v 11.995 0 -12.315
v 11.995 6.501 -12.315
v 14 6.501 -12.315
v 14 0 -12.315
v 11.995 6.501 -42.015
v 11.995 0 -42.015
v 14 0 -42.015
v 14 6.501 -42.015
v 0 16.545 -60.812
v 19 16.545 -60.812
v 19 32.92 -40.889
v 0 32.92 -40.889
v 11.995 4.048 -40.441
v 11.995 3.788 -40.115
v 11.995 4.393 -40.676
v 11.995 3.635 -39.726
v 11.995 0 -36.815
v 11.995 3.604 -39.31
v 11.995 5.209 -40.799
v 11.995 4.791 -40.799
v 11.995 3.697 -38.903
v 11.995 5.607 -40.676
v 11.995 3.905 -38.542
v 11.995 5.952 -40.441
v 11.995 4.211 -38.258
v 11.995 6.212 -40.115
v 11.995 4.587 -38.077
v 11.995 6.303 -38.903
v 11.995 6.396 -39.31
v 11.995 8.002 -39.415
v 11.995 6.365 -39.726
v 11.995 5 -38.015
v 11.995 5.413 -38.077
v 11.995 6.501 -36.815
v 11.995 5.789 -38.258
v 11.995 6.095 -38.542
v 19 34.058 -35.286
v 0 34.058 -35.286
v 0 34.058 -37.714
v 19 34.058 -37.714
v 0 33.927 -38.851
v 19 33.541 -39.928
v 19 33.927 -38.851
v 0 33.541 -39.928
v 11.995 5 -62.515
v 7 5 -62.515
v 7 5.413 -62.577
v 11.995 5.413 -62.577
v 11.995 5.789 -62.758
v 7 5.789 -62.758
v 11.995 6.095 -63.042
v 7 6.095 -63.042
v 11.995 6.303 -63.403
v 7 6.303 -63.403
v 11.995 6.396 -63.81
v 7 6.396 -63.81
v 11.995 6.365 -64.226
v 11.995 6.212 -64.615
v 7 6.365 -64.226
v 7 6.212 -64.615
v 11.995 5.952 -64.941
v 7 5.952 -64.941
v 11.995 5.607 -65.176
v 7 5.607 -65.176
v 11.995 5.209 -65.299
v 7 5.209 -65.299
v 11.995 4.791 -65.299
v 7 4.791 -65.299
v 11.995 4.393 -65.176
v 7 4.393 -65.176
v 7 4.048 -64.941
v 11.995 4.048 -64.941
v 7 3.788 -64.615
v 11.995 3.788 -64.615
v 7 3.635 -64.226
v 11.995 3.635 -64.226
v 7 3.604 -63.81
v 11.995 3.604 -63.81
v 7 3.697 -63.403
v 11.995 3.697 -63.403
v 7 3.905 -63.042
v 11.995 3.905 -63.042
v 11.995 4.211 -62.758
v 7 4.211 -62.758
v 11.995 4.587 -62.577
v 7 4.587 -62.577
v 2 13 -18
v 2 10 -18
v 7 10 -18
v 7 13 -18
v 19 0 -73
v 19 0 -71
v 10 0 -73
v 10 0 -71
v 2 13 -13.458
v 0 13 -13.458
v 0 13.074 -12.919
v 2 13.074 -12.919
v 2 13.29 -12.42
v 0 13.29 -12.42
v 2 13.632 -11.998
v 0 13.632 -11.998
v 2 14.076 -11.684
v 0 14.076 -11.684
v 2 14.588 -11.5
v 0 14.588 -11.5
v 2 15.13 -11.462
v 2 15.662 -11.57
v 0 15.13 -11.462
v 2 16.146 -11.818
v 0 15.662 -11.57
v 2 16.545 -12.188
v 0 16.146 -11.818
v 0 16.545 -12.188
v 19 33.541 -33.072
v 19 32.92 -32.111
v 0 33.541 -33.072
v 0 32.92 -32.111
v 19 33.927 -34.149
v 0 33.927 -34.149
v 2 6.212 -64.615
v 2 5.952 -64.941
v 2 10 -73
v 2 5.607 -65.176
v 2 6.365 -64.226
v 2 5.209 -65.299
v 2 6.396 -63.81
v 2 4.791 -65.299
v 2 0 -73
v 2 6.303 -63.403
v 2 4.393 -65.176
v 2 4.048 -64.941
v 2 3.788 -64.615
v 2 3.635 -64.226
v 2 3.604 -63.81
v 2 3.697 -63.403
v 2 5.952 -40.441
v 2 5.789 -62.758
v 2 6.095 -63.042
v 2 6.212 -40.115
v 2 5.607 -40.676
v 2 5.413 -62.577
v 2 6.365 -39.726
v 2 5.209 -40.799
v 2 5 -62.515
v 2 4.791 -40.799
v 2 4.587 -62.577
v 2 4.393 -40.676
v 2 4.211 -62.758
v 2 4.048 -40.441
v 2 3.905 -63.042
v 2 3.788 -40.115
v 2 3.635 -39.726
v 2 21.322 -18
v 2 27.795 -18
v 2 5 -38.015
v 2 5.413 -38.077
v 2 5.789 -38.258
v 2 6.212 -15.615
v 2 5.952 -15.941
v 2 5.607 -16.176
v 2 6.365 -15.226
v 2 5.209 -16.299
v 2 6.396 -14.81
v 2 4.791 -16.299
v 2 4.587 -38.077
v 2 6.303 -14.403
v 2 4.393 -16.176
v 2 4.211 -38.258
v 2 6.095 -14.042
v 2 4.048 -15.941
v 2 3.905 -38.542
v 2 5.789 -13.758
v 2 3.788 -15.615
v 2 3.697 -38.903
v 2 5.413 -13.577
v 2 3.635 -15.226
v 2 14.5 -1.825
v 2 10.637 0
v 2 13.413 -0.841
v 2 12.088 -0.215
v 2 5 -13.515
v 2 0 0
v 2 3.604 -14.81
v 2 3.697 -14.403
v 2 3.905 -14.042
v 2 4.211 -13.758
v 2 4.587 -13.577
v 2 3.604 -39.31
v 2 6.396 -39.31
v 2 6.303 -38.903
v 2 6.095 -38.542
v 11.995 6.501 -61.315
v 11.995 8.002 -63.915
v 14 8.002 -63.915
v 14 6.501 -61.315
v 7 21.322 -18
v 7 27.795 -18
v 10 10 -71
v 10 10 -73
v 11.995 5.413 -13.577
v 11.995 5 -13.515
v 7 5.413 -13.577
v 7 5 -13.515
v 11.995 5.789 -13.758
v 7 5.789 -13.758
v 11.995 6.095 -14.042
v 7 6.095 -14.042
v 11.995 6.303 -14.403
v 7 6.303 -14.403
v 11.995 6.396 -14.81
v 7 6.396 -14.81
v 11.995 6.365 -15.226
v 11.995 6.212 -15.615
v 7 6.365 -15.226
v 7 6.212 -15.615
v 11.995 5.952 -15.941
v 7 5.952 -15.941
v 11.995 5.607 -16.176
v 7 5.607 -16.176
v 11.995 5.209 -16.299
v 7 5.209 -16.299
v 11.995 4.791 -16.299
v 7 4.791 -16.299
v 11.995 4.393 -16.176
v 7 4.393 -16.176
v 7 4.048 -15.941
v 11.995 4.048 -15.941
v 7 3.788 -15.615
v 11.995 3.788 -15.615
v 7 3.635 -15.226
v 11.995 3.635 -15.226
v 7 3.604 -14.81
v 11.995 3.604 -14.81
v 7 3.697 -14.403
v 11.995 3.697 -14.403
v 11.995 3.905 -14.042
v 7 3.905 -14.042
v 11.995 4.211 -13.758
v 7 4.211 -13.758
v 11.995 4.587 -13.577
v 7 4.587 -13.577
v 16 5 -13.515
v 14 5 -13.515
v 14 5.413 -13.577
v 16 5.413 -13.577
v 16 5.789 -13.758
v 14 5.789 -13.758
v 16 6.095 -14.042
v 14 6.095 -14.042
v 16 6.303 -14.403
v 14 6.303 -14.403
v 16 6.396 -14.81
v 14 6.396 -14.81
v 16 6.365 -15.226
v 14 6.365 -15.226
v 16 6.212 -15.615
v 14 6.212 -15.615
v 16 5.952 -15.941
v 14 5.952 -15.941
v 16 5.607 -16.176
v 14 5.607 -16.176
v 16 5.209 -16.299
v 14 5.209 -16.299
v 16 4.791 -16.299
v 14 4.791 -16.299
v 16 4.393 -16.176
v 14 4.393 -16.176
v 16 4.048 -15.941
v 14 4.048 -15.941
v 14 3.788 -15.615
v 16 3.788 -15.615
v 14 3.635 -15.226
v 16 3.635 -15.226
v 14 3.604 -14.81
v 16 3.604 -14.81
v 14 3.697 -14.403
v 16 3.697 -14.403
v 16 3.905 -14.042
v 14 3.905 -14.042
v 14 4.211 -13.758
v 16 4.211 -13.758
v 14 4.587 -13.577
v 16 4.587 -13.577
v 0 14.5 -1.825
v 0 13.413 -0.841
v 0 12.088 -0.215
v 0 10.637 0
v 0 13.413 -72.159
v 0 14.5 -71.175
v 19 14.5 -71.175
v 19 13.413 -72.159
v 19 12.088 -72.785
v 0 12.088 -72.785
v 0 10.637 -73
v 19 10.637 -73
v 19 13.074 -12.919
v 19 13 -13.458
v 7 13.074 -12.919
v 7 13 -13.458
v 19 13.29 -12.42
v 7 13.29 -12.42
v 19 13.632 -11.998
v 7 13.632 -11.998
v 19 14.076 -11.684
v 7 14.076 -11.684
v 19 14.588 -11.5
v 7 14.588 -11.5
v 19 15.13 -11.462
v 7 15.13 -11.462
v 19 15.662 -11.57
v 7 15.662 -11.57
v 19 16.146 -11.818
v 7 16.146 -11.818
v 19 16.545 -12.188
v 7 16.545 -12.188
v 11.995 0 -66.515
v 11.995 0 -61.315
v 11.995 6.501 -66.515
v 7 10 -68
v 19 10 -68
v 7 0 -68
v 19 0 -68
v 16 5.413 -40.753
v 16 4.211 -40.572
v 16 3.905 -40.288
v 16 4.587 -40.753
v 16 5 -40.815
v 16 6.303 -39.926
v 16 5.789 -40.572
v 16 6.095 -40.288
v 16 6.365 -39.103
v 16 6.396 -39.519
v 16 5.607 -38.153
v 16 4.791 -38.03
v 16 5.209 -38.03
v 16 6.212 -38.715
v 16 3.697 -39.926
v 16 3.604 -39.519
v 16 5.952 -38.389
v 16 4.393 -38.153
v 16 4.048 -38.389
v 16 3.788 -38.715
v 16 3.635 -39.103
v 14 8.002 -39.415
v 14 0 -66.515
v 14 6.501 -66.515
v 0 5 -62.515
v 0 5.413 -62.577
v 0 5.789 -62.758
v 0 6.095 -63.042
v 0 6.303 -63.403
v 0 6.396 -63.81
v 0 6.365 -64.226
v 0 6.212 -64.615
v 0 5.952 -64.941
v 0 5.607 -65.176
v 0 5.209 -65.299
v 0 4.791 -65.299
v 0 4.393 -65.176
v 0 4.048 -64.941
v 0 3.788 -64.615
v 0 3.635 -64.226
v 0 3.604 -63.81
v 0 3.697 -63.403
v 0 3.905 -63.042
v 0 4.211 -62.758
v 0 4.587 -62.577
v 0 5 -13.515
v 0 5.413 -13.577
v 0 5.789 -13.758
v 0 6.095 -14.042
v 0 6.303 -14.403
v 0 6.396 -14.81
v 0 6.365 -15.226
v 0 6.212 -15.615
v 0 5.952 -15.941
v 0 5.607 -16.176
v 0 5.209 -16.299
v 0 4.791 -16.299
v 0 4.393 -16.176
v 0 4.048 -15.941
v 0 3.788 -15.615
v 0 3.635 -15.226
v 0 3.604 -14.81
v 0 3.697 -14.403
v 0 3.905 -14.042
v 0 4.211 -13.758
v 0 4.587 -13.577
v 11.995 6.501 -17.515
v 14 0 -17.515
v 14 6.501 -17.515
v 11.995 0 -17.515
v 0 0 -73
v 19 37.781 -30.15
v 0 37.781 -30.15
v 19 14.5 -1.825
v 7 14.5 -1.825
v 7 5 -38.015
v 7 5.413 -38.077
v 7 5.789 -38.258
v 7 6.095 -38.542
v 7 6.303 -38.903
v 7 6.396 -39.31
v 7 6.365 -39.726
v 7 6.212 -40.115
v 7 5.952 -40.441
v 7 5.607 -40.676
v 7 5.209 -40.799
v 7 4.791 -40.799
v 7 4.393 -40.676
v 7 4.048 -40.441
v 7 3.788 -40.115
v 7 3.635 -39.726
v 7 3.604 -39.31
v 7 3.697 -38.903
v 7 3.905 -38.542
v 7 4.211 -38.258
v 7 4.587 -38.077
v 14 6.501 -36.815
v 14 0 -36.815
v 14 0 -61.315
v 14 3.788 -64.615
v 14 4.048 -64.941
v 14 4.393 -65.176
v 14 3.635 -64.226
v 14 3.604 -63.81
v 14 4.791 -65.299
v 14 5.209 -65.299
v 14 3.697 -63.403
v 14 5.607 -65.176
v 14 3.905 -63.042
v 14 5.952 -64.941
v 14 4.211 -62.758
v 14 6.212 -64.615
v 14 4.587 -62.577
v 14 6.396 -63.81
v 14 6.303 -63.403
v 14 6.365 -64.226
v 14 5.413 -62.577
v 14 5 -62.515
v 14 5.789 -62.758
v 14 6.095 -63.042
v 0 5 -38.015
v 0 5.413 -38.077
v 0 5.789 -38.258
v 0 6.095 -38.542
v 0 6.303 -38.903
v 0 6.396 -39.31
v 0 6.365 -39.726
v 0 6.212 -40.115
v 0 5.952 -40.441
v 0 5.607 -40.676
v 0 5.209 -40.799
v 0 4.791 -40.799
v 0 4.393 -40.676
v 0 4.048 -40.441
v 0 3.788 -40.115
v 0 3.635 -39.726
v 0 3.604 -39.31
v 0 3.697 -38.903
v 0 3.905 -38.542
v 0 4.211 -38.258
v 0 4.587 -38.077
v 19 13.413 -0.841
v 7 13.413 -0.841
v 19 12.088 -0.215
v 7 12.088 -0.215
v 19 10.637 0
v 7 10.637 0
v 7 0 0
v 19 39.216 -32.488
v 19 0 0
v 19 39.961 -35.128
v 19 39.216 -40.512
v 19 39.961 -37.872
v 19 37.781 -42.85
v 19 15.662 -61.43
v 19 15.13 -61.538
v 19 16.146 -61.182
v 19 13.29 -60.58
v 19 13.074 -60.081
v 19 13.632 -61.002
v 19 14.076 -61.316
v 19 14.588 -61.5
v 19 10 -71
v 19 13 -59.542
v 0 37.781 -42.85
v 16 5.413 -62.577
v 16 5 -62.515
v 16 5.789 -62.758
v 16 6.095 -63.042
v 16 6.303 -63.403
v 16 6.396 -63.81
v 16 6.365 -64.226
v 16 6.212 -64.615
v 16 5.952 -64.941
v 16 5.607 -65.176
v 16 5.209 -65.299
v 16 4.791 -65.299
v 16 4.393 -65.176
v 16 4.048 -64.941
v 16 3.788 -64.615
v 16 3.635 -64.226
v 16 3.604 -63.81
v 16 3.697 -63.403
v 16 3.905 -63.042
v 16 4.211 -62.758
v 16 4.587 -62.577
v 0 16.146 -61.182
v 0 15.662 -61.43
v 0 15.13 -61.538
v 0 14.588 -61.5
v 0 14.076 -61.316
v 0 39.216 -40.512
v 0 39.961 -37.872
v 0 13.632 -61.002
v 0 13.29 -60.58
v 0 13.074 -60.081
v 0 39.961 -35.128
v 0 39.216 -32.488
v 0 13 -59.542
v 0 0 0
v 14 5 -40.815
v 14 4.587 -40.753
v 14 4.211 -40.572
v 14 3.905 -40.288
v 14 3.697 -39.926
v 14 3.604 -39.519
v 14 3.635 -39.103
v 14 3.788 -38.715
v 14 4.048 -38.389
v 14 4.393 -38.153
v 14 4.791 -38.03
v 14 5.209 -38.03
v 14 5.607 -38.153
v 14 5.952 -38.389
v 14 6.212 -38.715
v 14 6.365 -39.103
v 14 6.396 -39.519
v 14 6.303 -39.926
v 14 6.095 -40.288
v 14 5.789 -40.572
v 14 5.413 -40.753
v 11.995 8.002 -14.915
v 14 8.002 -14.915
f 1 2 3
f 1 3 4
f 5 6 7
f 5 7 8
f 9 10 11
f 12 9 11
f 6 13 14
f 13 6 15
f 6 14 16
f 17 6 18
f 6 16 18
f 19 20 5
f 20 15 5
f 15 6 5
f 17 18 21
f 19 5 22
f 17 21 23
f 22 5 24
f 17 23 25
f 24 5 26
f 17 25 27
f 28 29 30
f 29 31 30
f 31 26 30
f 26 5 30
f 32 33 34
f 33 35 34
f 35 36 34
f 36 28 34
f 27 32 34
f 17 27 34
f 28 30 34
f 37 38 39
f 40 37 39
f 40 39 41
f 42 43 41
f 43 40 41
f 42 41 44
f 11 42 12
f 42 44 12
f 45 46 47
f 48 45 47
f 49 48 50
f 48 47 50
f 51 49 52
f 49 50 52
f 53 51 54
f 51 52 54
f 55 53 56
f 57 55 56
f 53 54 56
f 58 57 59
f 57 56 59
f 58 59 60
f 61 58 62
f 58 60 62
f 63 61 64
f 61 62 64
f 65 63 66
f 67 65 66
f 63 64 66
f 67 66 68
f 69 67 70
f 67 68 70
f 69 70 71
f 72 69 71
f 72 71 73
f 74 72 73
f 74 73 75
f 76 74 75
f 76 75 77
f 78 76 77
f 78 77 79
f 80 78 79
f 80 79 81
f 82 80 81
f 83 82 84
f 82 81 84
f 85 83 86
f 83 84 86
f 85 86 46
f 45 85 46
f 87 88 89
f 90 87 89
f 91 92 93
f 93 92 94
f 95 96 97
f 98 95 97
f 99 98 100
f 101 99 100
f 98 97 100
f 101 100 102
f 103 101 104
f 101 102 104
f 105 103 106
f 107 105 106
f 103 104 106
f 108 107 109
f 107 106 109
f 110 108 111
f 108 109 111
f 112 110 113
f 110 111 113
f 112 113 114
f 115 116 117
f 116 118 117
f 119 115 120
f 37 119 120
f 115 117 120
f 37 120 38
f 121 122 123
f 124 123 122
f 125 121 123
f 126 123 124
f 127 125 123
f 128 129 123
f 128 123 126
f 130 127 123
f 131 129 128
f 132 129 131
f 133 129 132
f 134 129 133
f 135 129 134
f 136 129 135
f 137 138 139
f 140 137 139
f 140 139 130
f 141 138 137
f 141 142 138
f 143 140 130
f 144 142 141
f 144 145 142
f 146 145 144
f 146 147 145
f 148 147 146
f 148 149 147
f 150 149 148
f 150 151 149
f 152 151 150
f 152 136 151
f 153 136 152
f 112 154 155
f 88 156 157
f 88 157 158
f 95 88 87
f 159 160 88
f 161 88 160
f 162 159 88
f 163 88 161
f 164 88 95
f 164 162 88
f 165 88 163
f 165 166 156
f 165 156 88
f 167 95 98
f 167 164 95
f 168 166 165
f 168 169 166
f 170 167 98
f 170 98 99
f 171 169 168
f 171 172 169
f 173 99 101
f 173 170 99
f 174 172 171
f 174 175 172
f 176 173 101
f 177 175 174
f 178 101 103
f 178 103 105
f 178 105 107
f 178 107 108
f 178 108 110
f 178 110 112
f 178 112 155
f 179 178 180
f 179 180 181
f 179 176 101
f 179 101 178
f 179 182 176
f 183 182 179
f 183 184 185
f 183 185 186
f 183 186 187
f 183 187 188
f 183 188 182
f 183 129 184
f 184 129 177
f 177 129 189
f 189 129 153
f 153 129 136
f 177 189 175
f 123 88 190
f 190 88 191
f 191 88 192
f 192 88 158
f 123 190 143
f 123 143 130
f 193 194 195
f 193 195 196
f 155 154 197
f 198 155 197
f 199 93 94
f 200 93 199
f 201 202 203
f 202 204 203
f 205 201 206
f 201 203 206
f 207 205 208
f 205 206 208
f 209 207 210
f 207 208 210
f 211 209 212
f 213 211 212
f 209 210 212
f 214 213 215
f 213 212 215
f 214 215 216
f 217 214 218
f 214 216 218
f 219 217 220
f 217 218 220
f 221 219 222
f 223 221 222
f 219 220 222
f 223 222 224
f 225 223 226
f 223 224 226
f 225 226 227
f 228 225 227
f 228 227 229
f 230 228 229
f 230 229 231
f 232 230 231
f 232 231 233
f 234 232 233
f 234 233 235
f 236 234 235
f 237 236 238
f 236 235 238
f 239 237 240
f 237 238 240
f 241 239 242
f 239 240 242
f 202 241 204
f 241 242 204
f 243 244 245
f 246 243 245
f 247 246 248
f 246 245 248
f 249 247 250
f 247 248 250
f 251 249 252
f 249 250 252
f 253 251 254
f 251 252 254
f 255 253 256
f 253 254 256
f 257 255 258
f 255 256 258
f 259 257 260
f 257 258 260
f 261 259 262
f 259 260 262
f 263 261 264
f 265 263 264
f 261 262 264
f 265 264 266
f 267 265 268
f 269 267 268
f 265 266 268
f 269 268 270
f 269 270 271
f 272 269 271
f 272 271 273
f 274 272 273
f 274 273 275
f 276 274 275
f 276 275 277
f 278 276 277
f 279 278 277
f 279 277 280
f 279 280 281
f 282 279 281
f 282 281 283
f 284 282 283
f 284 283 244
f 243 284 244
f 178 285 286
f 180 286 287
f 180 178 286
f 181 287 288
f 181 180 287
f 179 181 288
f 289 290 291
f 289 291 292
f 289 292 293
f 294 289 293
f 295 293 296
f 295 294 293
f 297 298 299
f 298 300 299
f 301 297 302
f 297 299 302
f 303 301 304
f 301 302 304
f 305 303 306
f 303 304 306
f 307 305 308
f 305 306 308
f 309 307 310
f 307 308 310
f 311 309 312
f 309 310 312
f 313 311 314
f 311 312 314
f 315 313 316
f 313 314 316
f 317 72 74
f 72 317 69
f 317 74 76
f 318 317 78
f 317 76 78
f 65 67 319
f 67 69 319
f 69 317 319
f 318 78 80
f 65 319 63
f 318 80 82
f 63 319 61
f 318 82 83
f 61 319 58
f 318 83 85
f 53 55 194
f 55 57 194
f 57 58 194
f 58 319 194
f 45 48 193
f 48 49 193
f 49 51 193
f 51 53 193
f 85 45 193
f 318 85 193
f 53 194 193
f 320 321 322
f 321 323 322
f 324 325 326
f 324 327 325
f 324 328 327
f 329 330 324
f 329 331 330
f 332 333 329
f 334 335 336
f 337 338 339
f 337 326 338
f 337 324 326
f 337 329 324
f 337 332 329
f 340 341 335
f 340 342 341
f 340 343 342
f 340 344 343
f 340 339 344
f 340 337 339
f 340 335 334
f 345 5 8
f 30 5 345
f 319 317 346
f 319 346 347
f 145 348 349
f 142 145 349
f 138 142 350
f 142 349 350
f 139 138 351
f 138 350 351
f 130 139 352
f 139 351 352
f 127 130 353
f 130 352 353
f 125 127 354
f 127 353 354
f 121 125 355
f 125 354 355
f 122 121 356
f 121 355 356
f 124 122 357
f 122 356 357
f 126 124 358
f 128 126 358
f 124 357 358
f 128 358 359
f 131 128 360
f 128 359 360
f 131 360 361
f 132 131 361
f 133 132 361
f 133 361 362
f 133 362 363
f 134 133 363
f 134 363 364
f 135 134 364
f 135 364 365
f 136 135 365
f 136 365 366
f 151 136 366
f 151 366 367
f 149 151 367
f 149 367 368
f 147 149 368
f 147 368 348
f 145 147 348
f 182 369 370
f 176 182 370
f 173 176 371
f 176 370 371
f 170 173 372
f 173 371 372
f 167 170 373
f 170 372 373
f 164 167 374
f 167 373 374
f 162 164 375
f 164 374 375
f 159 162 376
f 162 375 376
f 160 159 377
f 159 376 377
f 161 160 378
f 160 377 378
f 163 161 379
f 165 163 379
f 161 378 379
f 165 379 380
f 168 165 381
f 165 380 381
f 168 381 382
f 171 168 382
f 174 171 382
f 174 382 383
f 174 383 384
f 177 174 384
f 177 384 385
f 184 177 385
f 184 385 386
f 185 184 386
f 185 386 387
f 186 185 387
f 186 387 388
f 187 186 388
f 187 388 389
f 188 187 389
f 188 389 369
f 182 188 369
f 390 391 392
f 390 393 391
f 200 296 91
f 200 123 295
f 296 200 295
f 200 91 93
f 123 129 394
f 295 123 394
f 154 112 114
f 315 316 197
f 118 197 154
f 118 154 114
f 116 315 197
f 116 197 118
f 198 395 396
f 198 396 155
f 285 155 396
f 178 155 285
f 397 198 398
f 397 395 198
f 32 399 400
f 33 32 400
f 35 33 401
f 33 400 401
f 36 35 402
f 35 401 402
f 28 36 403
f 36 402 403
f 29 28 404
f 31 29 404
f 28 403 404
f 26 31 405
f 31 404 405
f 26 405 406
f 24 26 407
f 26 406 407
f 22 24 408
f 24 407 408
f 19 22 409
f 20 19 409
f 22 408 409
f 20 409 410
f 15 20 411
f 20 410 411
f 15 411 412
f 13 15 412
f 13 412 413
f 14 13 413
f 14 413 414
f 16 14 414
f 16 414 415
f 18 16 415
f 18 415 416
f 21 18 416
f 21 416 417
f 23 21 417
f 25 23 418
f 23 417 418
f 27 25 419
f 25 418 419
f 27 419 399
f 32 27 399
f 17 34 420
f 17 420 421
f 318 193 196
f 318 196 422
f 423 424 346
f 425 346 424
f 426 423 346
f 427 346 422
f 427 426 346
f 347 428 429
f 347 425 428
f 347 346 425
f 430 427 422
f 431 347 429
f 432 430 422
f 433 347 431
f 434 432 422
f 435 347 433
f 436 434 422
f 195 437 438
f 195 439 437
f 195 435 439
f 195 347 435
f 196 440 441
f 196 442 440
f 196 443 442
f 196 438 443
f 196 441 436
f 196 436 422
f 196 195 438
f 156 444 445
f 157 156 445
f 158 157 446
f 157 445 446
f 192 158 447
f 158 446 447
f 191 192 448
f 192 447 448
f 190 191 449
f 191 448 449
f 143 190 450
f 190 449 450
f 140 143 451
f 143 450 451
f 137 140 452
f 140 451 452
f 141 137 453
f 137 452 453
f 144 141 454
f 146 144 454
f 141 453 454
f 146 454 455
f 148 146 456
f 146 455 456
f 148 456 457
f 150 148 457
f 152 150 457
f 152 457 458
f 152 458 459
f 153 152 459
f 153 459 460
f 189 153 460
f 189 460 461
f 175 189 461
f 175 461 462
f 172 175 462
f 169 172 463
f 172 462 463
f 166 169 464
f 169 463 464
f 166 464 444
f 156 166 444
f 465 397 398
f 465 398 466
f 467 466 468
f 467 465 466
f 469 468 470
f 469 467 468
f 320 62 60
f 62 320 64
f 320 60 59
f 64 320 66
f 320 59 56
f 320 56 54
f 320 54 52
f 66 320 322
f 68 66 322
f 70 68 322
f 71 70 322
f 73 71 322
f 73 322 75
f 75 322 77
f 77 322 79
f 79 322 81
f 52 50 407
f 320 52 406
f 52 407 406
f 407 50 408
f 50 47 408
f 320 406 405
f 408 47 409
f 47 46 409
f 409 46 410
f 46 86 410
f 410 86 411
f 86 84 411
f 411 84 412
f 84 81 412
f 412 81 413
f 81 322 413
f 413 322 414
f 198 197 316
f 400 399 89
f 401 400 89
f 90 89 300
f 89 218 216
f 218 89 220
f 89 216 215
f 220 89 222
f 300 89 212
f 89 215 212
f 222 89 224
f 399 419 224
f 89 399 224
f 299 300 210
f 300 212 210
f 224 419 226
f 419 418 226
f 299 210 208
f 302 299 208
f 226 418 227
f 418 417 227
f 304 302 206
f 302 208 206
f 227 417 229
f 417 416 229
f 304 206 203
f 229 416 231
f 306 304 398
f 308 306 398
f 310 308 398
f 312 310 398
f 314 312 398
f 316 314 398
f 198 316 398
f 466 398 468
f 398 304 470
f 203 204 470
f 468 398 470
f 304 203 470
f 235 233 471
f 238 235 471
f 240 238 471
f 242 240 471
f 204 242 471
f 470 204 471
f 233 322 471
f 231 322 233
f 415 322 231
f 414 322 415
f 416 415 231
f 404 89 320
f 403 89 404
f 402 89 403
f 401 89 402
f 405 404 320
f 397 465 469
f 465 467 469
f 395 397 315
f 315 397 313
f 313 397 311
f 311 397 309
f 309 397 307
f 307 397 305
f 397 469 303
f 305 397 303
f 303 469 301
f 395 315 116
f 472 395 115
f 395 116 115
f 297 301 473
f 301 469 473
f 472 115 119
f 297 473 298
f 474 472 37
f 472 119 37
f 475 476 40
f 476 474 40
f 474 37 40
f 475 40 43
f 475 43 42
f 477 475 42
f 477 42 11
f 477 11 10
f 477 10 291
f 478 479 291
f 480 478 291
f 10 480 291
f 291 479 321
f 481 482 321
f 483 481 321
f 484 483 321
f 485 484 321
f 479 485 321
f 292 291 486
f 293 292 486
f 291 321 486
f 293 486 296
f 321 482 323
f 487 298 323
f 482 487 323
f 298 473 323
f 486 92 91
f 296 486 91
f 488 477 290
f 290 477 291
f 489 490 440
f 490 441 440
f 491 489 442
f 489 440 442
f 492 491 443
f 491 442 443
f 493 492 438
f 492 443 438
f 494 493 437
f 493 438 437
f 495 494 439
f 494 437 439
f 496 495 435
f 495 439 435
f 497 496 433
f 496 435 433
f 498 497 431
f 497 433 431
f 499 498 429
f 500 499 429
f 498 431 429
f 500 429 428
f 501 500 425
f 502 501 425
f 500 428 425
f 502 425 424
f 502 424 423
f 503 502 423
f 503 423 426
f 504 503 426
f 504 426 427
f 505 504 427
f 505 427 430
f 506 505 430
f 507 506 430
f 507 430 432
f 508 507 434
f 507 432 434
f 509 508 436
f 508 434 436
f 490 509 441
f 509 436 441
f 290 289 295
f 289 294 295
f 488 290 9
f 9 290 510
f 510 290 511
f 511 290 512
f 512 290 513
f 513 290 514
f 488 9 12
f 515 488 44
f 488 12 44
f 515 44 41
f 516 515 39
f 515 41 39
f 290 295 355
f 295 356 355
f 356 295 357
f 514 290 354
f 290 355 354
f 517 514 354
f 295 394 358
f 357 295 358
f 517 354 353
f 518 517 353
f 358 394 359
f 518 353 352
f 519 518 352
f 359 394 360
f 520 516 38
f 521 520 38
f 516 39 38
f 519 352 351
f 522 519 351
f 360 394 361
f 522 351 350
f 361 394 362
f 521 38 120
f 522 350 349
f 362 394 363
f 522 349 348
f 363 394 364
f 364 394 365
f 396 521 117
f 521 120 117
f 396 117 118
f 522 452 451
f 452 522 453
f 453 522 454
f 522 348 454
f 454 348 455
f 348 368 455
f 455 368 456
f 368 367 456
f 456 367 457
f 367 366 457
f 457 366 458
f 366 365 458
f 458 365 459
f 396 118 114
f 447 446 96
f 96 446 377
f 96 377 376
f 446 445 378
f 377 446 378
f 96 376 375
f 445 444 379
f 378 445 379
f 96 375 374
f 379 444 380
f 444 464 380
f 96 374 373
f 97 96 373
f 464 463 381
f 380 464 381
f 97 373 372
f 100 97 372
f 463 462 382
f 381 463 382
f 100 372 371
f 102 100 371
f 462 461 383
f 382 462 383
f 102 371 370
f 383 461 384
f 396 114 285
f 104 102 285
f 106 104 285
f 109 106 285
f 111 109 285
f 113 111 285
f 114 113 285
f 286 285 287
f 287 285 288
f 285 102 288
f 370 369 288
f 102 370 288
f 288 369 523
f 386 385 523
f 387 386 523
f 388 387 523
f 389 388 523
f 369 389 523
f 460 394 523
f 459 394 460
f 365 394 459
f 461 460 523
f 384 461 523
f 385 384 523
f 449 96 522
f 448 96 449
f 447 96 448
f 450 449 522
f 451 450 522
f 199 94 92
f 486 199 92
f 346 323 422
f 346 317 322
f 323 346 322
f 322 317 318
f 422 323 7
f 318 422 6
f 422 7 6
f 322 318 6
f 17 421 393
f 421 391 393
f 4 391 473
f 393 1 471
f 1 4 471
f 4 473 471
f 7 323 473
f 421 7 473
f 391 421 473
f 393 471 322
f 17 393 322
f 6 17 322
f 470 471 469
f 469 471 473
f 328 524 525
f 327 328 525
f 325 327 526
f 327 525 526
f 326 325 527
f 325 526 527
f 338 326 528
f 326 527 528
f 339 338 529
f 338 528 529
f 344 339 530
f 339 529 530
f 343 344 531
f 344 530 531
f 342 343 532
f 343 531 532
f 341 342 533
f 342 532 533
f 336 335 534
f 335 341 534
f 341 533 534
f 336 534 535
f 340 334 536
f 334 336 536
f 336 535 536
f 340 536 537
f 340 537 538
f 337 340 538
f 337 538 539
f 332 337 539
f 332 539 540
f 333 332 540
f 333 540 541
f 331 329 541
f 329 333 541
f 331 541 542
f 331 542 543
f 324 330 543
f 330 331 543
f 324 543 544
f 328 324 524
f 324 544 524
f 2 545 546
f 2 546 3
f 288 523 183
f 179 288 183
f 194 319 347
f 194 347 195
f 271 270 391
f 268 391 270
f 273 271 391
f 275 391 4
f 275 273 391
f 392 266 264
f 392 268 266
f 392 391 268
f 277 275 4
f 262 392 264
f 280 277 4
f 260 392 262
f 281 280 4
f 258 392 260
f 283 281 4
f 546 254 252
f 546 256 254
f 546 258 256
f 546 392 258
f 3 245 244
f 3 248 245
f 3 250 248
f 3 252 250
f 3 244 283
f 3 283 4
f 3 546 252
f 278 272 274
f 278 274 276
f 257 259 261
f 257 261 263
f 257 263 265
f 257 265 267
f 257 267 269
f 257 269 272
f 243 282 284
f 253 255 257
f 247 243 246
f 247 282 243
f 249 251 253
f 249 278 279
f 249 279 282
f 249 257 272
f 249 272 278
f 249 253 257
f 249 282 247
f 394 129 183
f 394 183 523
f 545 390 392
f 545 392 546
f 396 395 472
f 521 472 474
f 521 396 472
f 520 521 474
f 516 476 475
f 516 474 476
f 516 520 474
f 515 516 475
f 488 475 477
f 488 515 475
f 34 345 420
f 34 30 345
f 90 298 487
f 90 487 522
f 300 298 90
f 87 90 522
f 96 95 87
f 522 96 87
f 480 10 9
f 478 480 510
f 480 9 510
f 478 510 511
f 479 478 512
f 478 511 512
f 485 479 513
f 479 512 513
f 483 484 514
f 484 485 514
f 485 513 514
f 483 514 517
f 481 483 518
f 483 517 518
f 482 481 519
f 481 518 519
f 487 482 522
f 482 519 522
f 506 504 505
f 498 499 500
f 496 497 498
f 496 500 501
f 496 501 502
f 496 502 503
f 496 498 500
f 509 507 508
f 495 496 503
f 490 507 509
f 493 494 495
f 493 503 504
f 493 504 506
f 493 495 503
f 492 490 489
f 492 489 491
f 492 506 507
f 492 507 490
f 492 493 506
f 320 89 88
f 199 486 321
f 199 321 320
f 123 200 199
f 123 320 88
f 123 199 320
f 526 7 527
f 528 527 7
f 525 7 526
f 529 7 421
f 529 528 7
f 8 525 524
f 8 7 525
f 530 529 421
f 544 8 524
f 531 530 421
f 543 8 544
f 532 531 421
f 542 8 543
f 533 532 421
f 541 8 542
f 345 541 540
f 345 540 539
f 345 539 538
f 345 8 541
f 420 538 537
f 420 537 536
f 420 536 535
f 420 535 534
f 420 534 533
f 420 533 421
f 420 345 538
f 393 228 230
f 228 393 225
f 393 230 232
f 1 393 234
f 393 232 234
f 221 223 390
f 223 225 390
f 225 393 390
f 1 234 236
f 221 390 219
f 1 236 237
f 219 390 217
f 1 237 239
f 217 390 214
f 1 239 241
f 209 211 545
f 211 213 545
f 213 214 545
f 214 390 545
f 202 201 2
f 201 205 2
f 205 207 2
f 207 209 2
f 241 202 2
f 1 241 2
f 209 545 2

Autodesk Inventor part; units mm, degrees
ref_plane "YZ Plane" through (0, 0, 0) normal (1, 0, 0) x (0, 1, 0)
ref_plane "XZ Plane" through (0, 0, 0) normal (0, 1, 0) x (-1, 0, 0)
ref_plane "XY Plane" through (0, 0, 0) normal (0, 0, 1) x (1, 0, 0)
sketch "Sketch1" plane through (0, 0, 0) normal (0, 1, 0) x (-1, 0, 0)
  line L0 (0, 0) -> (-19, 0)
  line L1 (-19, 0) -> (-19, -73)
  line L2 (-19, -73) -> (0, -73)
  line L3 (0, -73) -> (0, 0)
  dimension "d0" = 19
  dimension "d1" = 73
extrude "Extrusion1" add sketch "Sketch1" along normal blind 13
sketch "Sketch2" plane through (19, 0, 0) normal (1, 0, 0) x (0, 0, -1)
  line L0 (0, 13) -> (0, 43) construction
  line L1 (0, 43) -> (205, 43) construction
  line L2 (0, 13) -> (0, 13.5) construction
  line L3 (0, 0) -> (0, 13) construction
  line L4 (0, 13) -> (0, 13) construction
  line L5 (0, 13) -> (73, 13) construction
  line L6 (0, 13) -> (0, 13) construction
  line L7 (0, 13) -> (73, 13) construction
  line L8 (0, 13) -> (73, 13) construction
  line L9 (36.5, 13) -> (36.5, 43) construction
  line L10 (36.5, 43) -> (0, 13) construction
  line L11 (73, 13) -> (36.5, 43) construction
  line L12 (36.5, 43) -> (30.3197, 37.9203) construction
  line L13 (30.3197, 37.9203) -> (33.4945, 34.0576) construction
  line L14 (33.4945, 34.0576) -> (7.8744, 13) construction
  line L15 (36.5, 43) -> (42.6803, 37.9203) construction
  line L16 (42.6803, 37.9203) -> (39.5055, 34.0576) construction
  line L17 (33.4945, 34.0576) -> (39.5055, 34.0576)
  line L18 (36.5, 43) -> (0, 13)
  line L19 (0, 13) -> (7.8744, 13)
  line L20 (7.8744, 13) -> (33.4945, 34.0576)
  line L21 (73, 13) -> (0, 13) construction
  line L22 (73, 13) -> (0, 13) construction
  line L23 (73, 13) -> (0, 13) construction
  line L24 (36.5, 43) -> (73, 13) construction
  line L25 (39.5055, 34.0576) -> (65.1256, 13) construction
  line L26 (36.5, 43) -> (73, 13)
  line L27 (73, 13) -> (65.1256, 13)
  line L28 (65.1256, 13) -> (39.5055, 34.0576)
  dimension "d4" = 30
  dimension "d5" = 205
  dimension "d6" = 0.5
  dimension "d7" = 0
  dimension "d8" = 0
  dimension "d9" = 73
  dimension "d10" = 0
  dimension "d11" = 8
  dimension "d12" = 5
  dimension "d13" = 8
  dimension "d14" = 5
extrude "Extrusion2" add sketch "Sketch2" against normal up to surface (19 mm away)
fillet "Fillet1" radius 10 1 edges at (9.5, 43, -36.5)
fillet "Fillet4" radius 2 2 edges at (9.5, 13, -7.8744) (9.5, 13, -65.1256)
fillet "Fillet5" radius 5 2 edges at (9.5, 13, -73) (9.5, 13, 0)
sketch "Sketch3" plane through (0, 0, 0) normal (0, -1, 0) x (1, 0, 0)
  line L0 (0, -73) -> (0, 0) construction
  line L1 (0, -73) -> (2, -73) construction
  line L2 (19, -73) -> (0, -73) construction
  line L3 (2, -73) -> (2, 0)
  line L4 (0, 0) -> (19, 0) projected
  line L5 (2, -73) -> (7, -73) construction
  line L6 (7, -73) -> (7, 0)
  line L7 (7, -73) -> (80, -73) construction
  line L8 (7, -73) -> (2, -73)
  line L9 (7, 0) -> (2, 0)
  dimension "d24" = 2
  dimension "d25" = 5
  dimension "d26" = 90
extrude "Extrusion3" cut sketch "Sketch3" against normal blind 10
sketch "Sketch5" plane through (0, 10, 0) normal (0, -1, 0) x (1, 0, 0)
  line L0 (7, 0) -> (7, -73) projected
  line L1 (2, -73) -> (2, 0) projected
  line L2 (7, 0) -> (2, 0)
  line L3 (2, 0) -> (2, -18)
  line L4 (2, -18) -> (7, -18)
  line L5 (7, -18) -> (7, 0)
  point P0 (0, 0)
  dimension "d31" = 18
extrude "Extrusion5" cut sketch "Sketch5" against normal up to next
sketch "Sketch6" plane through (0, 0, -73) normal (-1, 0, 0) x (0, 0, 1)
  circle A0 centre (9.0852, 5) radius 1.4
  circle A1 centre (33.5852, 5) radius 1.4
  circle A2 centre (58.0852, 5) radius 1.4
  point P0 (73, 0)
extrude "Extrusion6" cut sketch "Sketch6" against normal blind 11.995
sketch "Sketch9" plane through (11.995, 5, -14.9148) normal (-1, 0, 0) x (0, 0, 1)
  circle A0 centre (0, 0) radius 3.002 construction
  circle A1 centre (0, 0) radius 1.4 construction
  line L0 (0, 0) -> (0, 3.002) construction
  line L1 (0, 3.002) -> (2.5998, 1.501)
  line L2 (2.5998, 1.501) -> (2.5998, -1.501)
  line L3 (2.5998, -1.501) -> (0, -3.002)
  line L4 (0, -3.002) -> (-2.5998, -1.501)
  line L5 (-2.5998, -1.501) -> (-2.5998, 1.501)
  line L6 (-2.5998, 1.501) -> (0, 3.002)
  line L7 (-58.0852, -5) -> (14.9148, -5) projected
  line L8 (-2.5998, -1.501) -> (-2.5998, -5)
  line L9 (14.9148, -5) -> (-58.0852, -5) projected
  line L10 (2.5998, -1.501) -> (2.5998, -5)
  line L11 (2.5998, -1.501) -> (6.0988, -1.501) construction
  line L12 (2.5998, -5) -> (-2.5998, -5)
  dimension "d38" = 6.004
  dimension "d41" = 90
extrude "Extrusion7" cut sketch "Sketch9" against normal blind 2.005
sketch "Sketch10" plane through (14, 5, -14.9148) normal (-1, 0, 0) x (0, 0, 1)
  circle A0 centre (0, 0) radius 1.4 projected
  line L0 (2.5998, -5) -> (-2.5998, -5) projected
  line L1 (2.5998, 1.501) -> (2.5998, -5) projected
  line L2 (0, 3.002) -> (2.5998, 1.501) projected
  line L3 (-2.5998, 1.501) -> (0, 3.002) projected
  line L4 (-2.5998, -5) -> (-2.5998, 1.501) projected
  point P0 (14.9148, -5)
extrude "Extrusion8" cut sketch "Sketch10" against normal blind 2 contours A0
ref_plane "Work Plane3" through (0, 5, -14.9148) normal (0, 0, -1) x (1, 0, 0)
ref_plane "Work Plane4" through (0, 5, -39.4148) normal (0, 0, 1) x (1, 0, 0)
ref_plane "Work Plane5" through (0, 5, -63.9148) normal (0, 0, -1) x (1, 0, 0)
ref_plane "Work Plane6" through (0, 5, -27.1648) normal (0, 0, -1) x (1, 0, 0)
ref_plane "Work Plane7" through (0, 5, -51.6648) normal (0, 0, 1) x (1, 0, 0)
mirror "Mirror3" about plane through (0, 5, -27.1648) normal (0, 0, -1) of "Extrusion8", "Extrusion7"
mirror "Mirror4" about plane through (0, 5, -51.6648) normal (0, 0, 1) of "Mirror3"
fillet "Fillet6" radius 5 2 edges at (9.5, 34.0576, -39.5055) (9.5, 34.0576, -33.4945)
sketch "Sketch11" plane through (0, 0, 0) normal (0, -1, 0) x (1, 0, 0)
  line L0 (7, -73) -> (2, -73) construction
  line L1 (7, -73) -> (7, -71) construction
  line L2 (7, -73) -> (9, -73) construction
  line L3 (19, -42.8497) -> (19, -71.1748) projected
  line L4 (7, -71) -> (19, -71)
  line L5 (19, -71) -> (19, -68)
  line L6 (19, -68) -> (7, -68)
  line L7 (7, -68) -> (7, -71)
  point P0 (0, 0)
  dimension "d48" = 2
  dimension "d49" = 90
  dimension "d50" = 3
extrude "Extrusion9" cut sketch "Sketch11" against normal blind 10
sketch "Sketch12" plane through (19, 10.6374, -73) normal (0, 0, -1) x (-1, 0, 0)
  line L0 (12, -10.6374) -> (0, -10.6374) projected
  line L1 (0, -0.6374) -> (12, -0.6374) projected
  line L2 (12, -10.6374) -> (9, -10.6374)
  line L3 (9, -10.6374) -> (9, -0.6374)
  line L4 (9, -0.6374) -> (12, -0.6374)
  line L5 (12, -0.6374) -> (12, -10.6374)
  point P0 (19, -10.6374)
  dimension "d53" = 3
extrude "Extrusion10" cut sketch "Sketch12" against normal up to next
properties part number "bumper_backright"
